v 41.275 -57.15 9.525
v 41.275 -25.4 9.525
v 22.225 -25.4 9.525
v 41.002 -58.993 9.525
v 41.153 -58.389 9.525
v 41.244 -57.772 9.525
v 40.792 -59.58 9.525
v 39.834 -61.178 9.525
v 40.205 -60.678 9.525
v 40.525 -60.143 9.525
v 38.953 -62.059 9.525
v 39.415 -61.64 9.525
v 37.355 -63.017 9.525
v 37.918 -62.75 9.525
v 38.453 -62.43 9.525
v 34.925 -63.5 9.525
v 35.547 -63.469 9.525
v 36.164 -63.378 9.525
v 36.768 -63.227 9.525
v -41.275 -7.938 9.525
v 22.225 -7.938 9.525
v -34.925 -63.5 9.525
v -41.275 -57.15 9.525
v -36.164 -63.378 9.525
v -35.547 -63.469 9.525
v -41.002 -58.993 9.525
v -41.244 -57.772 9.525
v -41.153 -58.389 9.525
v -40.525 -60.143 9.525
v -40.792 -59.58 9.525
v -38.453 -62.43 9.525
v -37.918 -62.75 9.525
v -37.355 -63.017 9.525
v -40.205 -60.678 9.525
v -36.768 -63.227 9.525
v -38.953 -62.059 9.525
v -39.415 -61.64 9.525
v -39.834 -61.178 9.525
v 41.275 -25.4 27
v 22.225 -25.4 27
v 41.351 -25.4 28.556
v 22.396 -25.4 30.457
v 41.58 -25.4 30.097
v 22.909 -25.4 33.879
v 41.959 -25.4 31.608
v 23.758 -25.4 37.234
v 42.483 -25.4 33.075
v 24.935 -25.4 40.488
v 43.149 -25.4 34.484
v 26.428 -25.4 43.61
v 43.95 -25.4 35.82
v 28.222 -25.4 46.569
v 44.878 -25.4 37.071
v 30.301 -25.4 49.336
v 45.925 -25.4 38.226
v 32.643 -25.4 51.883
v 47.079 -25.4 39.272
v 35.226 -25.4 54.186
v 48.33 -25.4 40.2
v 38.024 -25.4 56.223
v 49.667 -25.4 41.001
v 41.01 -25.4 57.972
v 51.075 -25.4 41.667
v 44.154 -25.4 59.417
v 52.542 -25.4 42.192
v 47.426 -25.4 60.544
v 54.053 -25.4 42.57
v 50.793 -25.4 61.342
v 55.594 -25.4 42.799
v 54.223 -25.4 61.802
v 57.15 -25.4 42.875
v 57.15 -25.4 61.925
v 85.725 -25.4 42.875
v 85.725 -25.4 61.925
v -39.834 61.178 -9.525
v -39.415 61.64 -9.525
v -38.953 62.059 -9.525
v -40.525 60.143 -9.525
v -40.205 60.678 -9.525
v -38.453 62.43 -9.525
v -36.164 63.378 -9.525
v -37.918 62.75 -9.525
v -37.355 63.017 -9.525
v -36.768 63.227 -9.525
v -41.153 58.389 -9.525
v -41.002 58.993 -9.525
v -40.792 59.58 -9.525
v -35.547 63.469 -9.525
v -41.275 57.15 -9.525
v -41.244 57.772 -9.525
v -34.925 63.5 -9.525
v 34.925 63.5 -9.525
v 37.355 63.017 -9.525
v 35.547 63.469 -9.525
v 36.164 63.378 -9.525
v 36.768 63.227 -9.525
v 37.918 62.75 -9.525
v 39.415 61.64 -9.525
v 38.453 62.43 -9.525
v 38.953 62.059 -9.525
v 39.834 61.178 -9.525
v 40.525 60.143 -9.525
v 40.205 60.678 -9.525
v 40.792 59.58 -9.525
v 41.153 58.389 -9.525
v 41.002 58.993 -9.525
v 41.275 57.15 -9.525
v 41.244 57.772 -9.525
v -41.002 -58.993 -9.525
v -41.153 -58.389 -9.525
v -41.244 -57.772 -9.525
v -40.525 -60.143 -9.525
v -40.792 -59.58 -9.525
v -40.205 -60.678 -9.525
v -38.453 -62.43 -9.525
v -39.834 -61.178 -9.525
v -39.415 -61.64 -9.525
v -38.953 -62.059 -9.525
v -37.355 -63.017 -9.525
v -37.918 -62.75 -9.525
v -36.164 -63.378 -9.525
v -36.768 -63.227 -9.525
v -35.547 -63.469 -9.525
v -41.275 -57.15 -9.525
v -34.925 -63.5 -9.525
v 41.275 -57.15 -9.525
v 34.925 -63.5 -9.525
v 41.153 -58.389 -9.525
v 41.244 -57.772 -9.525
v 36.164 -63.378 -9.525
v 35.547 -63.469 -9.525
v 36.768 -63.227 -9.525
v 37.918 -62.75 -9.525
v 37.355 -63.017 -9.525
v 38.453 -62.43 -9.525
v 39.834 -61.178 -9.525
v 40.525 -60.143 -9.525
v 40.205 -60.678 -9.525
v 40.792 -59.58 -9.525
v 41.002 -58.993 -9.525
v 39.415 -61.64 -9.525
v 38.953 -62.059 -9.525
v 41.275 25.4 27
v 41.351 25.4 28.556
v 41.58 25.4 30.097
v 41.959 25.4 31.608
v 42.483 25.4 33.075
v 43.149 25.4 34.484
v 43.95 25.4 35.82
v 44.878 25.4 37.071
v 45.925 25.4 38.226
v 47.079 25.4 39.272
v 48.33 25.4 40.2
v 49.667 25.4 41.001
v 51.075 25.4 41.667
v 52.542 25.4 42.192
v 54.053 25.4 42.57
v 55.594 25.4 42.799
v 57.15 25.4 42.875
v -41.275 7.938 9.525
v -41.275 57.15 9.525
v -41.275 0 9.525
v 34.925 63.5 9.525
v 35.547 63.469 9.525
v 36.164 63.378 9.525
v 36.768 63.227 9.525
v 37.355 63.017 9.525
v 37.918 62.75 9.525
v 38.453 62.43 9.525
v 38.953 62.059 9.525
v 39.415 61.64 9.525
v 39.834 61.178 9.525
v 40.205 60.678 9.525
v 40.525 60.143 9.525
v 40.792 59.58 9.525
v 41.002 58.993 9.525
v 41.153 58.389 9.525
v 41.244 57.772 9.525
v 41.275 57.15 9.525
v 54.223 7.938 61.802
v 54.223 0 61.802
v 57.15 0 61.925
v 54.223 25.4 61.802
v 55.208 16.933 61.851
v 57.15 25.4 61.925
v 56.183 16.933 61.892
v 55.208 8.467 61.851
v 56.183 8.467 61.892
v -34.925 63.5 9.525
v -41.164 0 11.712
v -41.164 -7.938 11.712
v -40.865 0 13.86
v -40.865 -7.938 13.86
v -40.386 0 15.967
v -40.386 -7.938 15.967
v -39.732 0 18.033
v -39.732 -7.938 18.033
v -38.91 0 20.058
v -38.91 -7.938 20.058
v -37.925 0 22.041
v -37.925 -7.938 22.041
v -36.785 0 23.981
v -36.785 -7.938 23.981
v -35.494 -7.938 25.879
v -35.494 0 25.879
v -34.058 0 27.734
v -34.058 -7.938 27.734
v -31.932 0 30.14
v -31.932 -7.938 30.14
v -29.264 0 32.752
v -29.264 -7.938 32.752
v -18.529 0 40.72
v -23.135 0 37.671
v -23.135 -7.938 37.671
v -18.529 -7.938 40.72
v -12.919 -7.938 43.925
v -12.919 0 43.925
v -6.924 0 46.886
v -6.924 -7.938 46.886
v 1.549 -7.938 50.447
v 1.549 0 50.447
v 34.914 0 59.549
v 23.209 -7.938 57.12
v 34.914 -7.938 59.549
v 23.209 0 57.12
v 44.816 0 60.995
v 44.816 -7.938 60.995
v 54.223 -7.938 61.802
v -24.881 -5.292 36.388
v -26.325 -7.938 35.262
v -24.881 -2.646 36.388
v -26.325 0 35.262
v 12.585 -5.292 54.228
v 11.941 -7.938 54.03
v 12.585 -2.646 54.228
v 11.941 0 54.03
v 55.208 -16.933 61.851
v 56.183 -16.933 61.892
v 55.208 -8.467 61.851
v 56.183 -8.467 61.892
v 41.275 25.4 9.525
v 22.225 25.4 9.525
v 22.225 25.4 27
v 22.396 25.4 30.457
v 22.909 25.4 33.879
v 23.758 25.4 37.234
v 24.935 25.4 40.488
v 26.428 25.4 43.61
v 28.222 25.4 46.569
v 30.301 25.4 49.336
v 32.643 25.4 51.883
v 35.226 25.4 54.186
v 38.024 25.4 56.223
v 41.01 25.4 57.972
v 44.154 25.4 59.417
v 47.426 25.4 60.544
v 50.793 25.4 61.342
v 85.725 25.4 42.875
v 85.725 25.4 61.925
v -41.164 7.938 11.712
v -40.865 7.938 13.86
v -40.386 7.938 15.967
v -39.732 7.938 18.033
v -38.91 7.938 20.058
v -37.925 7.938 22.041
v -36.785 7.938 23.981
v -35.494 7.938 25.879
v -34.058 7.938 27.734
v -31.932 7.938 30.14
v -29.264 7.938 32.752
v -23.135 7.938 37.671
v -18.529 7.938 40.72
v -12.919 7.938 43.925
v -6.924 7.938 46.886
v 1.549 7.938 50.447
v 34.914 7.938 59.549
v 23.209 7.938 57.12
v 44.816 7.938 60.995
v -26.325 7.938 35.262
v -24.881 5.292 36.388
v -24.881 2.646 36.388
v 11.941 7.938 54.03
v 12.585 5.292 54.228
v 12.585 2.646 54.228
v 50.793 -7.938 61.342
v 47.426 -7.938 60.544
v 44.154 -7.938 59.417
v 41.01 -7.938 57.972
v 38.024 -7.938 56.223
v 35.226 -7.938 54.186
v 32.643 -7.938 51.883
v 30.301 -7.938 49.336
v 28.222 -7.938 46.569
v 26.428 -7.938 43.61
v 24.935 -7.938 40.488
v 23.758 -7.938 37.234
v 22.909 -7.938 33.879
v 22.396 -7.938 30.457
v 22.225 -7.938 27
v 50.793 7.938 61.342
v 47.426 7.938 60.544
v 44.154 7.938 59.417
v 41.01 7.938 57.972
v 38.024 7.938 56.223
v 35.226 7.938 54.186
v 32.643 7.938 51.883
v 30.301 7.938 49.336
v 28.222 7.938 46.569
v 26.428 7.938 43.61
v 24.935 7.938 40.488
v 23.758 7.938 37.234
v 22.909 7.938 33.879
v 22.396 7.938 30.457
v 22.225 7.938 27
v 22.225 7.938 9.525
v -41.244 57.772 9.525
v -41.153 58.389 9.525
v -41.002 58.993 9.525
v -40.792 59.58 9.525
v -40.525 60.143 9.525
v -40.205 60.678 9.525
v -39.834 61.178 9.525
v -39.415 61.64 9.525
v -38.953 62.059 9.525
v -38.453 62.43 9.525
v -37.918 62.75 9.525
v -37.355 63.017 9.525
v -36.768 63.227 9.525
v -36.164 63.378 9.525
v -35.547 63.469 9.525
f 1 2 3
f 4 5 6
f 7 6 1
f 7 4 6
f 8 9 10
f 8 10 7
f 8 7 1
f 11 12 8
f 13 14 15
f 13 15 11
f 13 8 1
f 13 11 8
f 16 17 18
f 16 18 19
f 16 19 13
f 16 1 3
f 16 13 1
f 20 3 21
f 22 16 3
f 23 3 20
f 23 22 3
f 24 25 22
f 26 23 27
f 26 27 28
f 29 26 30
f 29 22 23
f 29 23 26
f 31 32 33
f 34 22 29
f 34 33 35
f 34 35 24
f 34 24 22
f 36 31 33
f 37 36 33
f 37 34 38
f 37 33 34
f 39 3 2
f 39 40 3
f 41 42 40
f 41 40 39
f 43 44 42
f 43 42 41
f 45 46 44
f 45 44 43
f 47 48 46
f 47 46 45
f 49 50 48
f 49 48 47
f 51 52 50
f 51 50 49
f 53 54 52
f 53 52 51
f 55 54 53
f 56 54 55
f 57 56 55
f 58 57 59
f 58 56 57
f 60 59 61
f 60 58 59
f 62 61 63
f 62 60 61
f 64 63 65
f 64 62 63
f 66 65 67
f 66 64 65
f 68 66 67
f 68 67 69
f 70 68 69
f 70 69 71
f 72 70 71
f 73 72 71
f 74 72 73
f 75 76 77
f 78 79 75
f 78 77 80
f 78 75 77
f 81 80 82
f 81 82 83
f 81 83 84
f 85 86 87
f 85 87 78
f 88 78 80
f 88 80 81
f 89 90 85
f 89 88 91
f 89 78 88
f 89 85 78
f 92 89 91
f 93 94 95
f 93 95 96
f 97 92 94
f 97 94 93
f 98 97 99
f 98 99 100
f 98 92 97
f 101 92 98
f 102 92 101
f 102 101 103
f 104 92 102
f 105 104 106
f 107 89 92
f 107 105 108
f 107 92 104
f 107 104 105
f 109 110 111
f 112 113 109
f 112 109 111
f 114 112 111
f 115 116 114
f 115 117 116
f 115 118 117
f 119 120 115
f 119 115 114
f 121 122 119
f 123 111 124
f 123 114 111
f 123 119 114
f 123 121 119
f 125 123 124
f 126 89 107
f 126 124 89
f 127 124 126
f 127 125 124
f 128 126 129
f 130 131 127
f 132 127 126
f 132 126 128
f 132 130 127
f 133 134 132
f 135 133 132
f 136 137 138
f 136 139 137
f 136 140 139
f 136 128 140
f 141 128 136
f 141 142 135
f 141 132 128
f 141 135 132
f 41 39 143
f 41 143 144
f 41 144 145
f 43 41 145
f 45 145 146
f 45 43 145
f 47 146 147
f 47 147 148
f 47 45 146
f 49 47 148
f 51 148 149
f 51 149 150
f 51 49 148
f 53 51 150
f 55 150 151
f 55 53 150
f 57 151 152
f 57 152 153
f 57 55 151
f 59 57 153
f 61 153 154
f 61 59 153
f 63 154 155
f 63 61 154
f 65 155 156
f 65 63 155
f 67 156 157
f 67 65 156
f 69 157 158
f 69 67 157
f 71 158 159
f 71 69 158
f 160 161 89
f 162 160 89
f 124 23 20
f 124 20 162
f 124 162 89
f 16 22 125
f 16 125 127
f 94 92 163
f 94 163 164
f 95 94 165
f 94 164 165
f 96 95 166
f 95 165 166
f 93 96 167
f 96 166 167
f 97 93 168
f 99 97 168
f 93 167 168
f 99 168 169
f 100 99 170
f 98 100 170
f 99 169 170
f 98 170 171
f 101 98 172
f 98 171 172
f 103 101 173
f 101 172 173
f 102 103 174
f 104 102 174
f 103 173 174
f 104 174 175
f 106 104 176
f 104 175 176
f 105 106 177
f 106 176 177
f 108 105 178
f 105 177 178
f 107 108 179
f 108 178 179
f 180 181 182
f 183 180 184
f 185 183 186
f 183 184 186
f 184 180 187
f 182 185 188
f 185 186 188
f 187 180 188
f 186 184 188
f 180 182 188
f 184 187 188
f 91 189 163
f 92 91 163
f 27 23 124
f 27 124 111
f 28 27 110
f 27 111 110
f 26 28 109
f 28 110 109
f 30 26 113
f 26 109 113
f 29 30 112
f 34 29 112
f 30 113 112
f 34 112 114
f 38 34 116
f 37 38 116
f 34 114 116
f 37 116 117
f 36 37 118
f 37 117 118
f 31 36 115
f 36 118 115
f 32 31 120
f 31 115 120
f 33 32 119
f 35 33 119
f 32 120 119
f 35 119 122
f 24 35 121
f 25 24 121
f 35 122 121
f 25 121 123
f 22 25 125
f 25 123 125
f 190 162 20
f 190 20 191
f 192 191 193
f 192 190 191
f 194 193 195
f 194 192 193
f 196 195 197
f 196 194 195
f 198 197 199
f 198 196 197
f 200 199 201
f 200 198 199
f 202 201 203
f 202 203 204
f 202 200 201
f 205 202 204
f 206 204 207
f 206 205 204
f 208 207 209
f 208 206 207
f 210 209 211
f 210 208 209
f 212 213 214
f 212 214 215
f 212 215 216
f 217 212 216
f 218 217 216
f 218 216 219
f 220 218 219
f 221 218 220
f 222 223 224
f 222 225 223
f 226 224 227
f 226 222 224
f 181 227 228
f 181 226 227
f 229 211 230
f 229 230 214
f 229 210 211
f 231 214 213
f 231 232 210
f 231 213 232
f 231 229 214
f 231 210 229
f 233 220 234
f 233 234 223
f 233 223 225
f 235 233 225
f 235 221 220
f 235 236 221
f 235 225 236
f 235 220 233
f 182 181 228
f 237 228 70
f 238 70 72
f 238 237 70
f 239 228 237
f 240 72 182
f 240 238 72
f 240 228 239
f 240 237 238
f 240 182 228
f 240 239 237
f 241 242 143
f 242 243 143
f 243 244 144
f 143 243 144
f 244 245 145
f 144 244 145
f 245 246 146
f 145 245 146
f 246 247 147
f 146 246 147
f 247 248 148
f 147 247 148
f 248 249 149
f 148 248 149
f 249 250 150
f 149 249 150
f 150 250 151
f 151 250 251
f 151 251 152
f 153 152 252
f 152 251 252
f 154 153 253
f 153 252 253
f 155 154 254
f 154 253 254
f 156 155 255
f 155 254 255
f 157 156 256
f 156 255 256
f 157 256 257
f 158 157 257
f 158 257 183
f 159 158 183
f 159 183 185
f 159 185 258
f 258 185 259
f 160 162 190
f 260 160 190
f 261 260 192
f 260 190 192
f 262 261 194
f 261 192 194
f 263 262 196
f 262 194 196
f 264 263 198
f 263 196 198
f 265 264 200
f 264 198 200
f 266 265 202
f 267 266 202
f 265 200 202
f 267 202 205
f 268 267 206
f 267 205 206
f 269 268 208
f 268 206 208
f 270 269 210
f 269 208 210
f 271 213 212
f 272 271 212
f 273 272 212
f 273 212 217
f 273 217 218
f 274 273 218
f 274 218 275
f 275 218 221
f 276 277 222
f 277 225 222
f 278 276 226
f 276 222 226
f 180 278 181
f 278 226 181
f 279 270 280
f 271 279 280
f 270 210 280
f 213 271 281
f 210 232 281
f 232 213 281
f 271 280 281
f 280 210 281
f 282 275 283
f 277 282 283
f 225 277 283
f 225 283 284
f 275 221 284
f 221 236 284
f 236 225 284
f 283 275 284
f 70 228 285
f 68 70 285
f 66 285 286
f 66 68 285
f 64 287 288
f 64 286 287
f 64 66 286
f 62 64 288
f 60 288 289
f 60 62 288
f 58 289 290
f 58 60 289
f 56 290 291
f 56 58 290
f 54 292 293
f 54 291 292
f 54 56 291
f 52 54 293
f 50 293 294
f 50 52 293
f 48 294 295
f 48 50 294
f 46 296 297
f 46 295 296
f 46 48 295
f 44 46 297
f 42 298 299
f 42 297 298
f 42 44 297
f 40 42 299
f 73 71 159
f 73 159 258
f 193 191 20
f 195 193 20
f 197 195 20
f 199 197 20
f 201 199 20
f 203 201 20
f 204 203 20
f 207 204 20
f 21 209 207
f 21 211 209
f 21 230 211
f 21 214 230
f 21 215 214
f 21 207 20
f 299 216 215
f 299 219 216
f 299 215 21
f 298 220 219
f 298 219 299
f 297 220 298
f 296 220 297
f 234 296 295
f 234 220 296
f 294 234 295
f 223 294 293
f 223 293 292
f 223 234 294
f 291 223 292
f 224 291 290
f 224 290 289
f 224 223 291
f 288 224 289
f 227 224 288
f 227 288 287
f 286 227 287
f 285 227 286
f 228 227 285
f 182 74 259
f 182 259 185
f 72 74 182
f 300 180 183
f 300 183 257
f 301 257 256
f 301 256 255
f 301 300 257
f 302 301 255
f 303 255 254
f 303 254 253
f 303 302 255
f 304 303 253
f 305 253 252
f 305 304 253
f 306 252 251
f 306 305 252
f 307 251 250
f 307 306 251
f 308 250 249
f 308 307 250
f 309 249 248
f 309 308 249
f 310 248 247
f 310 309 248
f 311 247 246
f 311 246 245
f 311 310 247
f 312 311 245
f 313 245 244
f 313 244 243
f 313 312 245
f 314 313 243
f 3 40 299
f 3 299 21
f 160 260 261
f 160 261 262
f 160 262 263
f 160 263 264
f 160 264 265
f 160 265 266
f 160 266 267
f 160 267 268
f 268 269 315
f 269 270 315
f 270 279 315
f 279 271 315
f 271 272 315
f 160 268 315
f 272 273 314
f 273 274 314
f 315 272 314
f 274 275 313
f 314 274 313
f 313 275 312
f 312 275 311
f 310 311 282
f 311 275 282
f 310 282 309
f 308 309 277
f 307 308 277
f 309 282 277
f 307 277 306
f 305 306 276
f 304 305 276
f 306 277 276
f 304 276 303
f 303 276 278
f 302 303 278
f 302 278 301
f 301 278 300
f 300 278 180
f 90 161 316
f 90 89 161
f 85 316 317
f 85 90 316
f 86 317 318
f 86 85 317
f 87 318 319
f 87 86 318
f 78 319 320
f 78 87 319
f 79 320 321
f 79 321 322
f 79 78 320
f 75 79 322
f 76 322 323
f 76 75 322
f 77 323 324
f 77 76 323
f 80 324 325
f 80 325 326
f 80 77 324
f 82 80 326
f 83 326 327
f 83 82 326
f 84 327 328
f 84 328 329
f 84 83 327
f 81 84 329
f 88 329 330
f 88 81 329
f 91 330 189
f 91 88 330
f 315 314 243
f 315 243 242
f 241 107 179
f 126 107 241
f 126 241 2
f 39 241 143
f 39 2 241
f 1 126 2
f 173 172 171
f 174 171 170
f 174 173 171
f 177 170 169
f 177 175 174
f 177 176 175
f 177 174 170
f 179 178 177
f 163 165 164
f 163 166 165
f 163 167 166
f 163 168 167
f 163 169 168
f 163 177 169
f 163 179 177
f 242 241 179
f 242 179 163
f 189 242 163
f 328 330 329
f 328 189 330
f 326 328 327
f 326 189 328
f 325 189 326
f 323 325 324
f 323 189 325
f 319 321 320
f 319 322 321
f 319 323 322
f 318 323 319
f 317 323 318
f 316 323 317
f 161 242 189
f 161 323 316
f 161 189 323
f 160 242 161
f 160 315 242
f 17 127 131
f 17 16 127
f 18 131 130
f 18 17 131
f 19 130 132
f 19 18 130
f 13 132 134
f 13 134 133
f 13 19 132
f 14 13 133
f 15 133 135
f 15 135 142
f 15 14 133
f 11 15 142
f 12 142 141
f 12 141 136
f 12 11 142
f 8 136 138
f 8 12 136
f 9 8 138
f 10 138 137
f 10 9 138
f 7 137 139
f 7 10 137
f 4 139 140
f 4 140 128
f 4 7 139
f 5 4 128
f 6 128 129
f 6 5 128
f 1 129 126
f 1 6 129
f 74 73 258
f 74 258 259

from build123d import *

# Parameters (mm, degrees)
F1_DEPTH = 63.5
F0_W     = 25.4
F0_H     = 19.05
F2_DEPTH = 25.4
F3_DEPTH = 7.9375
F4_R     = 6.35


with BuildPart() as f1:
    # F0 (on Front) → F1 (new body, symmetric)
    with BuildSketch(Plane.XZ):
        Polygon((41.275, -9.525), (41.275, 9.525), (22.225, 9.525), (-41.275, 9.525), (-41.275, -9.525), align=None)
    extrude(amount=F1_DEPTH, both=True)

    # F0 (on Front) → F2 (join, symmetric)
    with BuildSketch(Plane.XZ):
        with BuildLine():
            Line((22.225, 9.525), (41.275, 9.525))
            Line((41.275, 9.525), (41.275, 27.0002))
            ThreePointArc((41.275, 27.0002), (45.9246798487, 38.2255201513), (57.15, 42.8752))
            Line((57.15, 42.8752), (60.325, 42.8752))
            Line((60.325, 42.8752), (60.325, 61.9252))
            Line((60.325, 61.9252), (57.15, 61.9252))
            add(Edge.make_bspline(
                [(54.22326899, 61.8023532465), (55.2121587279, 61.8549706116), (56.1881793337, 61.8959521575), (57.15, 61.9252)],
                knots=[108.6829517829, 108.6829517829, 108.6829517829, 108.6829517829, 111.5045361635, 111.5045361635, 111.5045361635, 111.5045361635], degree=3))
            ThreePointArc((54.22326899, 61.8023532465), (31.440354869, 50.6385115352), (22.225, 27.0002))
            Line((22.225, 27.0002), (22.225, 9.525))
        make_face()
        with Locations((73.025, 52.4002)):
            Rectangle(F0_W, F0_H)
    extrude(amount=F2_DEPTH, both=True)

    # F0 (on Front) → F3 (join, symmetric)
    with BuildSketch(Plane.XZ):
        with BuildLine():
            Line((-41.275, 9.525), (22.225, 9.525))
            Line((22.225, 9.525), (22.225, 27.0002))
            ThreePointArc((22.225, 27.0002), (31.440354869, 50.6385115352), (54.22326899, 61.8023532465))
            add(Edge.make_bspline(
                [(-41.275, 9.525), (-41.0511784846, 40.4851844974), (16.1328058977, 59.7756158605), (54.22326899, 61.8023532465)],
                knots=[0, 0, 0, 0, 108.6829517829, 108.6829517829, 108.6829517829, 108.6829517829], degree=3))
        make_face()
    extrude(amount=F3_DEPTH, both=True)

    # F4
    f4_edges = [f1.edges().sort_by_distance(p)[0] for p in [
        (41.275, -63.5, 0),
        (-41.275, -63.5, 0),
        (-41.275, 63.5, 0),
        (41.275, 63.5, 0),
    ]]
    fillet(f4_edges, radius=F4_R)


solid = f1.part
